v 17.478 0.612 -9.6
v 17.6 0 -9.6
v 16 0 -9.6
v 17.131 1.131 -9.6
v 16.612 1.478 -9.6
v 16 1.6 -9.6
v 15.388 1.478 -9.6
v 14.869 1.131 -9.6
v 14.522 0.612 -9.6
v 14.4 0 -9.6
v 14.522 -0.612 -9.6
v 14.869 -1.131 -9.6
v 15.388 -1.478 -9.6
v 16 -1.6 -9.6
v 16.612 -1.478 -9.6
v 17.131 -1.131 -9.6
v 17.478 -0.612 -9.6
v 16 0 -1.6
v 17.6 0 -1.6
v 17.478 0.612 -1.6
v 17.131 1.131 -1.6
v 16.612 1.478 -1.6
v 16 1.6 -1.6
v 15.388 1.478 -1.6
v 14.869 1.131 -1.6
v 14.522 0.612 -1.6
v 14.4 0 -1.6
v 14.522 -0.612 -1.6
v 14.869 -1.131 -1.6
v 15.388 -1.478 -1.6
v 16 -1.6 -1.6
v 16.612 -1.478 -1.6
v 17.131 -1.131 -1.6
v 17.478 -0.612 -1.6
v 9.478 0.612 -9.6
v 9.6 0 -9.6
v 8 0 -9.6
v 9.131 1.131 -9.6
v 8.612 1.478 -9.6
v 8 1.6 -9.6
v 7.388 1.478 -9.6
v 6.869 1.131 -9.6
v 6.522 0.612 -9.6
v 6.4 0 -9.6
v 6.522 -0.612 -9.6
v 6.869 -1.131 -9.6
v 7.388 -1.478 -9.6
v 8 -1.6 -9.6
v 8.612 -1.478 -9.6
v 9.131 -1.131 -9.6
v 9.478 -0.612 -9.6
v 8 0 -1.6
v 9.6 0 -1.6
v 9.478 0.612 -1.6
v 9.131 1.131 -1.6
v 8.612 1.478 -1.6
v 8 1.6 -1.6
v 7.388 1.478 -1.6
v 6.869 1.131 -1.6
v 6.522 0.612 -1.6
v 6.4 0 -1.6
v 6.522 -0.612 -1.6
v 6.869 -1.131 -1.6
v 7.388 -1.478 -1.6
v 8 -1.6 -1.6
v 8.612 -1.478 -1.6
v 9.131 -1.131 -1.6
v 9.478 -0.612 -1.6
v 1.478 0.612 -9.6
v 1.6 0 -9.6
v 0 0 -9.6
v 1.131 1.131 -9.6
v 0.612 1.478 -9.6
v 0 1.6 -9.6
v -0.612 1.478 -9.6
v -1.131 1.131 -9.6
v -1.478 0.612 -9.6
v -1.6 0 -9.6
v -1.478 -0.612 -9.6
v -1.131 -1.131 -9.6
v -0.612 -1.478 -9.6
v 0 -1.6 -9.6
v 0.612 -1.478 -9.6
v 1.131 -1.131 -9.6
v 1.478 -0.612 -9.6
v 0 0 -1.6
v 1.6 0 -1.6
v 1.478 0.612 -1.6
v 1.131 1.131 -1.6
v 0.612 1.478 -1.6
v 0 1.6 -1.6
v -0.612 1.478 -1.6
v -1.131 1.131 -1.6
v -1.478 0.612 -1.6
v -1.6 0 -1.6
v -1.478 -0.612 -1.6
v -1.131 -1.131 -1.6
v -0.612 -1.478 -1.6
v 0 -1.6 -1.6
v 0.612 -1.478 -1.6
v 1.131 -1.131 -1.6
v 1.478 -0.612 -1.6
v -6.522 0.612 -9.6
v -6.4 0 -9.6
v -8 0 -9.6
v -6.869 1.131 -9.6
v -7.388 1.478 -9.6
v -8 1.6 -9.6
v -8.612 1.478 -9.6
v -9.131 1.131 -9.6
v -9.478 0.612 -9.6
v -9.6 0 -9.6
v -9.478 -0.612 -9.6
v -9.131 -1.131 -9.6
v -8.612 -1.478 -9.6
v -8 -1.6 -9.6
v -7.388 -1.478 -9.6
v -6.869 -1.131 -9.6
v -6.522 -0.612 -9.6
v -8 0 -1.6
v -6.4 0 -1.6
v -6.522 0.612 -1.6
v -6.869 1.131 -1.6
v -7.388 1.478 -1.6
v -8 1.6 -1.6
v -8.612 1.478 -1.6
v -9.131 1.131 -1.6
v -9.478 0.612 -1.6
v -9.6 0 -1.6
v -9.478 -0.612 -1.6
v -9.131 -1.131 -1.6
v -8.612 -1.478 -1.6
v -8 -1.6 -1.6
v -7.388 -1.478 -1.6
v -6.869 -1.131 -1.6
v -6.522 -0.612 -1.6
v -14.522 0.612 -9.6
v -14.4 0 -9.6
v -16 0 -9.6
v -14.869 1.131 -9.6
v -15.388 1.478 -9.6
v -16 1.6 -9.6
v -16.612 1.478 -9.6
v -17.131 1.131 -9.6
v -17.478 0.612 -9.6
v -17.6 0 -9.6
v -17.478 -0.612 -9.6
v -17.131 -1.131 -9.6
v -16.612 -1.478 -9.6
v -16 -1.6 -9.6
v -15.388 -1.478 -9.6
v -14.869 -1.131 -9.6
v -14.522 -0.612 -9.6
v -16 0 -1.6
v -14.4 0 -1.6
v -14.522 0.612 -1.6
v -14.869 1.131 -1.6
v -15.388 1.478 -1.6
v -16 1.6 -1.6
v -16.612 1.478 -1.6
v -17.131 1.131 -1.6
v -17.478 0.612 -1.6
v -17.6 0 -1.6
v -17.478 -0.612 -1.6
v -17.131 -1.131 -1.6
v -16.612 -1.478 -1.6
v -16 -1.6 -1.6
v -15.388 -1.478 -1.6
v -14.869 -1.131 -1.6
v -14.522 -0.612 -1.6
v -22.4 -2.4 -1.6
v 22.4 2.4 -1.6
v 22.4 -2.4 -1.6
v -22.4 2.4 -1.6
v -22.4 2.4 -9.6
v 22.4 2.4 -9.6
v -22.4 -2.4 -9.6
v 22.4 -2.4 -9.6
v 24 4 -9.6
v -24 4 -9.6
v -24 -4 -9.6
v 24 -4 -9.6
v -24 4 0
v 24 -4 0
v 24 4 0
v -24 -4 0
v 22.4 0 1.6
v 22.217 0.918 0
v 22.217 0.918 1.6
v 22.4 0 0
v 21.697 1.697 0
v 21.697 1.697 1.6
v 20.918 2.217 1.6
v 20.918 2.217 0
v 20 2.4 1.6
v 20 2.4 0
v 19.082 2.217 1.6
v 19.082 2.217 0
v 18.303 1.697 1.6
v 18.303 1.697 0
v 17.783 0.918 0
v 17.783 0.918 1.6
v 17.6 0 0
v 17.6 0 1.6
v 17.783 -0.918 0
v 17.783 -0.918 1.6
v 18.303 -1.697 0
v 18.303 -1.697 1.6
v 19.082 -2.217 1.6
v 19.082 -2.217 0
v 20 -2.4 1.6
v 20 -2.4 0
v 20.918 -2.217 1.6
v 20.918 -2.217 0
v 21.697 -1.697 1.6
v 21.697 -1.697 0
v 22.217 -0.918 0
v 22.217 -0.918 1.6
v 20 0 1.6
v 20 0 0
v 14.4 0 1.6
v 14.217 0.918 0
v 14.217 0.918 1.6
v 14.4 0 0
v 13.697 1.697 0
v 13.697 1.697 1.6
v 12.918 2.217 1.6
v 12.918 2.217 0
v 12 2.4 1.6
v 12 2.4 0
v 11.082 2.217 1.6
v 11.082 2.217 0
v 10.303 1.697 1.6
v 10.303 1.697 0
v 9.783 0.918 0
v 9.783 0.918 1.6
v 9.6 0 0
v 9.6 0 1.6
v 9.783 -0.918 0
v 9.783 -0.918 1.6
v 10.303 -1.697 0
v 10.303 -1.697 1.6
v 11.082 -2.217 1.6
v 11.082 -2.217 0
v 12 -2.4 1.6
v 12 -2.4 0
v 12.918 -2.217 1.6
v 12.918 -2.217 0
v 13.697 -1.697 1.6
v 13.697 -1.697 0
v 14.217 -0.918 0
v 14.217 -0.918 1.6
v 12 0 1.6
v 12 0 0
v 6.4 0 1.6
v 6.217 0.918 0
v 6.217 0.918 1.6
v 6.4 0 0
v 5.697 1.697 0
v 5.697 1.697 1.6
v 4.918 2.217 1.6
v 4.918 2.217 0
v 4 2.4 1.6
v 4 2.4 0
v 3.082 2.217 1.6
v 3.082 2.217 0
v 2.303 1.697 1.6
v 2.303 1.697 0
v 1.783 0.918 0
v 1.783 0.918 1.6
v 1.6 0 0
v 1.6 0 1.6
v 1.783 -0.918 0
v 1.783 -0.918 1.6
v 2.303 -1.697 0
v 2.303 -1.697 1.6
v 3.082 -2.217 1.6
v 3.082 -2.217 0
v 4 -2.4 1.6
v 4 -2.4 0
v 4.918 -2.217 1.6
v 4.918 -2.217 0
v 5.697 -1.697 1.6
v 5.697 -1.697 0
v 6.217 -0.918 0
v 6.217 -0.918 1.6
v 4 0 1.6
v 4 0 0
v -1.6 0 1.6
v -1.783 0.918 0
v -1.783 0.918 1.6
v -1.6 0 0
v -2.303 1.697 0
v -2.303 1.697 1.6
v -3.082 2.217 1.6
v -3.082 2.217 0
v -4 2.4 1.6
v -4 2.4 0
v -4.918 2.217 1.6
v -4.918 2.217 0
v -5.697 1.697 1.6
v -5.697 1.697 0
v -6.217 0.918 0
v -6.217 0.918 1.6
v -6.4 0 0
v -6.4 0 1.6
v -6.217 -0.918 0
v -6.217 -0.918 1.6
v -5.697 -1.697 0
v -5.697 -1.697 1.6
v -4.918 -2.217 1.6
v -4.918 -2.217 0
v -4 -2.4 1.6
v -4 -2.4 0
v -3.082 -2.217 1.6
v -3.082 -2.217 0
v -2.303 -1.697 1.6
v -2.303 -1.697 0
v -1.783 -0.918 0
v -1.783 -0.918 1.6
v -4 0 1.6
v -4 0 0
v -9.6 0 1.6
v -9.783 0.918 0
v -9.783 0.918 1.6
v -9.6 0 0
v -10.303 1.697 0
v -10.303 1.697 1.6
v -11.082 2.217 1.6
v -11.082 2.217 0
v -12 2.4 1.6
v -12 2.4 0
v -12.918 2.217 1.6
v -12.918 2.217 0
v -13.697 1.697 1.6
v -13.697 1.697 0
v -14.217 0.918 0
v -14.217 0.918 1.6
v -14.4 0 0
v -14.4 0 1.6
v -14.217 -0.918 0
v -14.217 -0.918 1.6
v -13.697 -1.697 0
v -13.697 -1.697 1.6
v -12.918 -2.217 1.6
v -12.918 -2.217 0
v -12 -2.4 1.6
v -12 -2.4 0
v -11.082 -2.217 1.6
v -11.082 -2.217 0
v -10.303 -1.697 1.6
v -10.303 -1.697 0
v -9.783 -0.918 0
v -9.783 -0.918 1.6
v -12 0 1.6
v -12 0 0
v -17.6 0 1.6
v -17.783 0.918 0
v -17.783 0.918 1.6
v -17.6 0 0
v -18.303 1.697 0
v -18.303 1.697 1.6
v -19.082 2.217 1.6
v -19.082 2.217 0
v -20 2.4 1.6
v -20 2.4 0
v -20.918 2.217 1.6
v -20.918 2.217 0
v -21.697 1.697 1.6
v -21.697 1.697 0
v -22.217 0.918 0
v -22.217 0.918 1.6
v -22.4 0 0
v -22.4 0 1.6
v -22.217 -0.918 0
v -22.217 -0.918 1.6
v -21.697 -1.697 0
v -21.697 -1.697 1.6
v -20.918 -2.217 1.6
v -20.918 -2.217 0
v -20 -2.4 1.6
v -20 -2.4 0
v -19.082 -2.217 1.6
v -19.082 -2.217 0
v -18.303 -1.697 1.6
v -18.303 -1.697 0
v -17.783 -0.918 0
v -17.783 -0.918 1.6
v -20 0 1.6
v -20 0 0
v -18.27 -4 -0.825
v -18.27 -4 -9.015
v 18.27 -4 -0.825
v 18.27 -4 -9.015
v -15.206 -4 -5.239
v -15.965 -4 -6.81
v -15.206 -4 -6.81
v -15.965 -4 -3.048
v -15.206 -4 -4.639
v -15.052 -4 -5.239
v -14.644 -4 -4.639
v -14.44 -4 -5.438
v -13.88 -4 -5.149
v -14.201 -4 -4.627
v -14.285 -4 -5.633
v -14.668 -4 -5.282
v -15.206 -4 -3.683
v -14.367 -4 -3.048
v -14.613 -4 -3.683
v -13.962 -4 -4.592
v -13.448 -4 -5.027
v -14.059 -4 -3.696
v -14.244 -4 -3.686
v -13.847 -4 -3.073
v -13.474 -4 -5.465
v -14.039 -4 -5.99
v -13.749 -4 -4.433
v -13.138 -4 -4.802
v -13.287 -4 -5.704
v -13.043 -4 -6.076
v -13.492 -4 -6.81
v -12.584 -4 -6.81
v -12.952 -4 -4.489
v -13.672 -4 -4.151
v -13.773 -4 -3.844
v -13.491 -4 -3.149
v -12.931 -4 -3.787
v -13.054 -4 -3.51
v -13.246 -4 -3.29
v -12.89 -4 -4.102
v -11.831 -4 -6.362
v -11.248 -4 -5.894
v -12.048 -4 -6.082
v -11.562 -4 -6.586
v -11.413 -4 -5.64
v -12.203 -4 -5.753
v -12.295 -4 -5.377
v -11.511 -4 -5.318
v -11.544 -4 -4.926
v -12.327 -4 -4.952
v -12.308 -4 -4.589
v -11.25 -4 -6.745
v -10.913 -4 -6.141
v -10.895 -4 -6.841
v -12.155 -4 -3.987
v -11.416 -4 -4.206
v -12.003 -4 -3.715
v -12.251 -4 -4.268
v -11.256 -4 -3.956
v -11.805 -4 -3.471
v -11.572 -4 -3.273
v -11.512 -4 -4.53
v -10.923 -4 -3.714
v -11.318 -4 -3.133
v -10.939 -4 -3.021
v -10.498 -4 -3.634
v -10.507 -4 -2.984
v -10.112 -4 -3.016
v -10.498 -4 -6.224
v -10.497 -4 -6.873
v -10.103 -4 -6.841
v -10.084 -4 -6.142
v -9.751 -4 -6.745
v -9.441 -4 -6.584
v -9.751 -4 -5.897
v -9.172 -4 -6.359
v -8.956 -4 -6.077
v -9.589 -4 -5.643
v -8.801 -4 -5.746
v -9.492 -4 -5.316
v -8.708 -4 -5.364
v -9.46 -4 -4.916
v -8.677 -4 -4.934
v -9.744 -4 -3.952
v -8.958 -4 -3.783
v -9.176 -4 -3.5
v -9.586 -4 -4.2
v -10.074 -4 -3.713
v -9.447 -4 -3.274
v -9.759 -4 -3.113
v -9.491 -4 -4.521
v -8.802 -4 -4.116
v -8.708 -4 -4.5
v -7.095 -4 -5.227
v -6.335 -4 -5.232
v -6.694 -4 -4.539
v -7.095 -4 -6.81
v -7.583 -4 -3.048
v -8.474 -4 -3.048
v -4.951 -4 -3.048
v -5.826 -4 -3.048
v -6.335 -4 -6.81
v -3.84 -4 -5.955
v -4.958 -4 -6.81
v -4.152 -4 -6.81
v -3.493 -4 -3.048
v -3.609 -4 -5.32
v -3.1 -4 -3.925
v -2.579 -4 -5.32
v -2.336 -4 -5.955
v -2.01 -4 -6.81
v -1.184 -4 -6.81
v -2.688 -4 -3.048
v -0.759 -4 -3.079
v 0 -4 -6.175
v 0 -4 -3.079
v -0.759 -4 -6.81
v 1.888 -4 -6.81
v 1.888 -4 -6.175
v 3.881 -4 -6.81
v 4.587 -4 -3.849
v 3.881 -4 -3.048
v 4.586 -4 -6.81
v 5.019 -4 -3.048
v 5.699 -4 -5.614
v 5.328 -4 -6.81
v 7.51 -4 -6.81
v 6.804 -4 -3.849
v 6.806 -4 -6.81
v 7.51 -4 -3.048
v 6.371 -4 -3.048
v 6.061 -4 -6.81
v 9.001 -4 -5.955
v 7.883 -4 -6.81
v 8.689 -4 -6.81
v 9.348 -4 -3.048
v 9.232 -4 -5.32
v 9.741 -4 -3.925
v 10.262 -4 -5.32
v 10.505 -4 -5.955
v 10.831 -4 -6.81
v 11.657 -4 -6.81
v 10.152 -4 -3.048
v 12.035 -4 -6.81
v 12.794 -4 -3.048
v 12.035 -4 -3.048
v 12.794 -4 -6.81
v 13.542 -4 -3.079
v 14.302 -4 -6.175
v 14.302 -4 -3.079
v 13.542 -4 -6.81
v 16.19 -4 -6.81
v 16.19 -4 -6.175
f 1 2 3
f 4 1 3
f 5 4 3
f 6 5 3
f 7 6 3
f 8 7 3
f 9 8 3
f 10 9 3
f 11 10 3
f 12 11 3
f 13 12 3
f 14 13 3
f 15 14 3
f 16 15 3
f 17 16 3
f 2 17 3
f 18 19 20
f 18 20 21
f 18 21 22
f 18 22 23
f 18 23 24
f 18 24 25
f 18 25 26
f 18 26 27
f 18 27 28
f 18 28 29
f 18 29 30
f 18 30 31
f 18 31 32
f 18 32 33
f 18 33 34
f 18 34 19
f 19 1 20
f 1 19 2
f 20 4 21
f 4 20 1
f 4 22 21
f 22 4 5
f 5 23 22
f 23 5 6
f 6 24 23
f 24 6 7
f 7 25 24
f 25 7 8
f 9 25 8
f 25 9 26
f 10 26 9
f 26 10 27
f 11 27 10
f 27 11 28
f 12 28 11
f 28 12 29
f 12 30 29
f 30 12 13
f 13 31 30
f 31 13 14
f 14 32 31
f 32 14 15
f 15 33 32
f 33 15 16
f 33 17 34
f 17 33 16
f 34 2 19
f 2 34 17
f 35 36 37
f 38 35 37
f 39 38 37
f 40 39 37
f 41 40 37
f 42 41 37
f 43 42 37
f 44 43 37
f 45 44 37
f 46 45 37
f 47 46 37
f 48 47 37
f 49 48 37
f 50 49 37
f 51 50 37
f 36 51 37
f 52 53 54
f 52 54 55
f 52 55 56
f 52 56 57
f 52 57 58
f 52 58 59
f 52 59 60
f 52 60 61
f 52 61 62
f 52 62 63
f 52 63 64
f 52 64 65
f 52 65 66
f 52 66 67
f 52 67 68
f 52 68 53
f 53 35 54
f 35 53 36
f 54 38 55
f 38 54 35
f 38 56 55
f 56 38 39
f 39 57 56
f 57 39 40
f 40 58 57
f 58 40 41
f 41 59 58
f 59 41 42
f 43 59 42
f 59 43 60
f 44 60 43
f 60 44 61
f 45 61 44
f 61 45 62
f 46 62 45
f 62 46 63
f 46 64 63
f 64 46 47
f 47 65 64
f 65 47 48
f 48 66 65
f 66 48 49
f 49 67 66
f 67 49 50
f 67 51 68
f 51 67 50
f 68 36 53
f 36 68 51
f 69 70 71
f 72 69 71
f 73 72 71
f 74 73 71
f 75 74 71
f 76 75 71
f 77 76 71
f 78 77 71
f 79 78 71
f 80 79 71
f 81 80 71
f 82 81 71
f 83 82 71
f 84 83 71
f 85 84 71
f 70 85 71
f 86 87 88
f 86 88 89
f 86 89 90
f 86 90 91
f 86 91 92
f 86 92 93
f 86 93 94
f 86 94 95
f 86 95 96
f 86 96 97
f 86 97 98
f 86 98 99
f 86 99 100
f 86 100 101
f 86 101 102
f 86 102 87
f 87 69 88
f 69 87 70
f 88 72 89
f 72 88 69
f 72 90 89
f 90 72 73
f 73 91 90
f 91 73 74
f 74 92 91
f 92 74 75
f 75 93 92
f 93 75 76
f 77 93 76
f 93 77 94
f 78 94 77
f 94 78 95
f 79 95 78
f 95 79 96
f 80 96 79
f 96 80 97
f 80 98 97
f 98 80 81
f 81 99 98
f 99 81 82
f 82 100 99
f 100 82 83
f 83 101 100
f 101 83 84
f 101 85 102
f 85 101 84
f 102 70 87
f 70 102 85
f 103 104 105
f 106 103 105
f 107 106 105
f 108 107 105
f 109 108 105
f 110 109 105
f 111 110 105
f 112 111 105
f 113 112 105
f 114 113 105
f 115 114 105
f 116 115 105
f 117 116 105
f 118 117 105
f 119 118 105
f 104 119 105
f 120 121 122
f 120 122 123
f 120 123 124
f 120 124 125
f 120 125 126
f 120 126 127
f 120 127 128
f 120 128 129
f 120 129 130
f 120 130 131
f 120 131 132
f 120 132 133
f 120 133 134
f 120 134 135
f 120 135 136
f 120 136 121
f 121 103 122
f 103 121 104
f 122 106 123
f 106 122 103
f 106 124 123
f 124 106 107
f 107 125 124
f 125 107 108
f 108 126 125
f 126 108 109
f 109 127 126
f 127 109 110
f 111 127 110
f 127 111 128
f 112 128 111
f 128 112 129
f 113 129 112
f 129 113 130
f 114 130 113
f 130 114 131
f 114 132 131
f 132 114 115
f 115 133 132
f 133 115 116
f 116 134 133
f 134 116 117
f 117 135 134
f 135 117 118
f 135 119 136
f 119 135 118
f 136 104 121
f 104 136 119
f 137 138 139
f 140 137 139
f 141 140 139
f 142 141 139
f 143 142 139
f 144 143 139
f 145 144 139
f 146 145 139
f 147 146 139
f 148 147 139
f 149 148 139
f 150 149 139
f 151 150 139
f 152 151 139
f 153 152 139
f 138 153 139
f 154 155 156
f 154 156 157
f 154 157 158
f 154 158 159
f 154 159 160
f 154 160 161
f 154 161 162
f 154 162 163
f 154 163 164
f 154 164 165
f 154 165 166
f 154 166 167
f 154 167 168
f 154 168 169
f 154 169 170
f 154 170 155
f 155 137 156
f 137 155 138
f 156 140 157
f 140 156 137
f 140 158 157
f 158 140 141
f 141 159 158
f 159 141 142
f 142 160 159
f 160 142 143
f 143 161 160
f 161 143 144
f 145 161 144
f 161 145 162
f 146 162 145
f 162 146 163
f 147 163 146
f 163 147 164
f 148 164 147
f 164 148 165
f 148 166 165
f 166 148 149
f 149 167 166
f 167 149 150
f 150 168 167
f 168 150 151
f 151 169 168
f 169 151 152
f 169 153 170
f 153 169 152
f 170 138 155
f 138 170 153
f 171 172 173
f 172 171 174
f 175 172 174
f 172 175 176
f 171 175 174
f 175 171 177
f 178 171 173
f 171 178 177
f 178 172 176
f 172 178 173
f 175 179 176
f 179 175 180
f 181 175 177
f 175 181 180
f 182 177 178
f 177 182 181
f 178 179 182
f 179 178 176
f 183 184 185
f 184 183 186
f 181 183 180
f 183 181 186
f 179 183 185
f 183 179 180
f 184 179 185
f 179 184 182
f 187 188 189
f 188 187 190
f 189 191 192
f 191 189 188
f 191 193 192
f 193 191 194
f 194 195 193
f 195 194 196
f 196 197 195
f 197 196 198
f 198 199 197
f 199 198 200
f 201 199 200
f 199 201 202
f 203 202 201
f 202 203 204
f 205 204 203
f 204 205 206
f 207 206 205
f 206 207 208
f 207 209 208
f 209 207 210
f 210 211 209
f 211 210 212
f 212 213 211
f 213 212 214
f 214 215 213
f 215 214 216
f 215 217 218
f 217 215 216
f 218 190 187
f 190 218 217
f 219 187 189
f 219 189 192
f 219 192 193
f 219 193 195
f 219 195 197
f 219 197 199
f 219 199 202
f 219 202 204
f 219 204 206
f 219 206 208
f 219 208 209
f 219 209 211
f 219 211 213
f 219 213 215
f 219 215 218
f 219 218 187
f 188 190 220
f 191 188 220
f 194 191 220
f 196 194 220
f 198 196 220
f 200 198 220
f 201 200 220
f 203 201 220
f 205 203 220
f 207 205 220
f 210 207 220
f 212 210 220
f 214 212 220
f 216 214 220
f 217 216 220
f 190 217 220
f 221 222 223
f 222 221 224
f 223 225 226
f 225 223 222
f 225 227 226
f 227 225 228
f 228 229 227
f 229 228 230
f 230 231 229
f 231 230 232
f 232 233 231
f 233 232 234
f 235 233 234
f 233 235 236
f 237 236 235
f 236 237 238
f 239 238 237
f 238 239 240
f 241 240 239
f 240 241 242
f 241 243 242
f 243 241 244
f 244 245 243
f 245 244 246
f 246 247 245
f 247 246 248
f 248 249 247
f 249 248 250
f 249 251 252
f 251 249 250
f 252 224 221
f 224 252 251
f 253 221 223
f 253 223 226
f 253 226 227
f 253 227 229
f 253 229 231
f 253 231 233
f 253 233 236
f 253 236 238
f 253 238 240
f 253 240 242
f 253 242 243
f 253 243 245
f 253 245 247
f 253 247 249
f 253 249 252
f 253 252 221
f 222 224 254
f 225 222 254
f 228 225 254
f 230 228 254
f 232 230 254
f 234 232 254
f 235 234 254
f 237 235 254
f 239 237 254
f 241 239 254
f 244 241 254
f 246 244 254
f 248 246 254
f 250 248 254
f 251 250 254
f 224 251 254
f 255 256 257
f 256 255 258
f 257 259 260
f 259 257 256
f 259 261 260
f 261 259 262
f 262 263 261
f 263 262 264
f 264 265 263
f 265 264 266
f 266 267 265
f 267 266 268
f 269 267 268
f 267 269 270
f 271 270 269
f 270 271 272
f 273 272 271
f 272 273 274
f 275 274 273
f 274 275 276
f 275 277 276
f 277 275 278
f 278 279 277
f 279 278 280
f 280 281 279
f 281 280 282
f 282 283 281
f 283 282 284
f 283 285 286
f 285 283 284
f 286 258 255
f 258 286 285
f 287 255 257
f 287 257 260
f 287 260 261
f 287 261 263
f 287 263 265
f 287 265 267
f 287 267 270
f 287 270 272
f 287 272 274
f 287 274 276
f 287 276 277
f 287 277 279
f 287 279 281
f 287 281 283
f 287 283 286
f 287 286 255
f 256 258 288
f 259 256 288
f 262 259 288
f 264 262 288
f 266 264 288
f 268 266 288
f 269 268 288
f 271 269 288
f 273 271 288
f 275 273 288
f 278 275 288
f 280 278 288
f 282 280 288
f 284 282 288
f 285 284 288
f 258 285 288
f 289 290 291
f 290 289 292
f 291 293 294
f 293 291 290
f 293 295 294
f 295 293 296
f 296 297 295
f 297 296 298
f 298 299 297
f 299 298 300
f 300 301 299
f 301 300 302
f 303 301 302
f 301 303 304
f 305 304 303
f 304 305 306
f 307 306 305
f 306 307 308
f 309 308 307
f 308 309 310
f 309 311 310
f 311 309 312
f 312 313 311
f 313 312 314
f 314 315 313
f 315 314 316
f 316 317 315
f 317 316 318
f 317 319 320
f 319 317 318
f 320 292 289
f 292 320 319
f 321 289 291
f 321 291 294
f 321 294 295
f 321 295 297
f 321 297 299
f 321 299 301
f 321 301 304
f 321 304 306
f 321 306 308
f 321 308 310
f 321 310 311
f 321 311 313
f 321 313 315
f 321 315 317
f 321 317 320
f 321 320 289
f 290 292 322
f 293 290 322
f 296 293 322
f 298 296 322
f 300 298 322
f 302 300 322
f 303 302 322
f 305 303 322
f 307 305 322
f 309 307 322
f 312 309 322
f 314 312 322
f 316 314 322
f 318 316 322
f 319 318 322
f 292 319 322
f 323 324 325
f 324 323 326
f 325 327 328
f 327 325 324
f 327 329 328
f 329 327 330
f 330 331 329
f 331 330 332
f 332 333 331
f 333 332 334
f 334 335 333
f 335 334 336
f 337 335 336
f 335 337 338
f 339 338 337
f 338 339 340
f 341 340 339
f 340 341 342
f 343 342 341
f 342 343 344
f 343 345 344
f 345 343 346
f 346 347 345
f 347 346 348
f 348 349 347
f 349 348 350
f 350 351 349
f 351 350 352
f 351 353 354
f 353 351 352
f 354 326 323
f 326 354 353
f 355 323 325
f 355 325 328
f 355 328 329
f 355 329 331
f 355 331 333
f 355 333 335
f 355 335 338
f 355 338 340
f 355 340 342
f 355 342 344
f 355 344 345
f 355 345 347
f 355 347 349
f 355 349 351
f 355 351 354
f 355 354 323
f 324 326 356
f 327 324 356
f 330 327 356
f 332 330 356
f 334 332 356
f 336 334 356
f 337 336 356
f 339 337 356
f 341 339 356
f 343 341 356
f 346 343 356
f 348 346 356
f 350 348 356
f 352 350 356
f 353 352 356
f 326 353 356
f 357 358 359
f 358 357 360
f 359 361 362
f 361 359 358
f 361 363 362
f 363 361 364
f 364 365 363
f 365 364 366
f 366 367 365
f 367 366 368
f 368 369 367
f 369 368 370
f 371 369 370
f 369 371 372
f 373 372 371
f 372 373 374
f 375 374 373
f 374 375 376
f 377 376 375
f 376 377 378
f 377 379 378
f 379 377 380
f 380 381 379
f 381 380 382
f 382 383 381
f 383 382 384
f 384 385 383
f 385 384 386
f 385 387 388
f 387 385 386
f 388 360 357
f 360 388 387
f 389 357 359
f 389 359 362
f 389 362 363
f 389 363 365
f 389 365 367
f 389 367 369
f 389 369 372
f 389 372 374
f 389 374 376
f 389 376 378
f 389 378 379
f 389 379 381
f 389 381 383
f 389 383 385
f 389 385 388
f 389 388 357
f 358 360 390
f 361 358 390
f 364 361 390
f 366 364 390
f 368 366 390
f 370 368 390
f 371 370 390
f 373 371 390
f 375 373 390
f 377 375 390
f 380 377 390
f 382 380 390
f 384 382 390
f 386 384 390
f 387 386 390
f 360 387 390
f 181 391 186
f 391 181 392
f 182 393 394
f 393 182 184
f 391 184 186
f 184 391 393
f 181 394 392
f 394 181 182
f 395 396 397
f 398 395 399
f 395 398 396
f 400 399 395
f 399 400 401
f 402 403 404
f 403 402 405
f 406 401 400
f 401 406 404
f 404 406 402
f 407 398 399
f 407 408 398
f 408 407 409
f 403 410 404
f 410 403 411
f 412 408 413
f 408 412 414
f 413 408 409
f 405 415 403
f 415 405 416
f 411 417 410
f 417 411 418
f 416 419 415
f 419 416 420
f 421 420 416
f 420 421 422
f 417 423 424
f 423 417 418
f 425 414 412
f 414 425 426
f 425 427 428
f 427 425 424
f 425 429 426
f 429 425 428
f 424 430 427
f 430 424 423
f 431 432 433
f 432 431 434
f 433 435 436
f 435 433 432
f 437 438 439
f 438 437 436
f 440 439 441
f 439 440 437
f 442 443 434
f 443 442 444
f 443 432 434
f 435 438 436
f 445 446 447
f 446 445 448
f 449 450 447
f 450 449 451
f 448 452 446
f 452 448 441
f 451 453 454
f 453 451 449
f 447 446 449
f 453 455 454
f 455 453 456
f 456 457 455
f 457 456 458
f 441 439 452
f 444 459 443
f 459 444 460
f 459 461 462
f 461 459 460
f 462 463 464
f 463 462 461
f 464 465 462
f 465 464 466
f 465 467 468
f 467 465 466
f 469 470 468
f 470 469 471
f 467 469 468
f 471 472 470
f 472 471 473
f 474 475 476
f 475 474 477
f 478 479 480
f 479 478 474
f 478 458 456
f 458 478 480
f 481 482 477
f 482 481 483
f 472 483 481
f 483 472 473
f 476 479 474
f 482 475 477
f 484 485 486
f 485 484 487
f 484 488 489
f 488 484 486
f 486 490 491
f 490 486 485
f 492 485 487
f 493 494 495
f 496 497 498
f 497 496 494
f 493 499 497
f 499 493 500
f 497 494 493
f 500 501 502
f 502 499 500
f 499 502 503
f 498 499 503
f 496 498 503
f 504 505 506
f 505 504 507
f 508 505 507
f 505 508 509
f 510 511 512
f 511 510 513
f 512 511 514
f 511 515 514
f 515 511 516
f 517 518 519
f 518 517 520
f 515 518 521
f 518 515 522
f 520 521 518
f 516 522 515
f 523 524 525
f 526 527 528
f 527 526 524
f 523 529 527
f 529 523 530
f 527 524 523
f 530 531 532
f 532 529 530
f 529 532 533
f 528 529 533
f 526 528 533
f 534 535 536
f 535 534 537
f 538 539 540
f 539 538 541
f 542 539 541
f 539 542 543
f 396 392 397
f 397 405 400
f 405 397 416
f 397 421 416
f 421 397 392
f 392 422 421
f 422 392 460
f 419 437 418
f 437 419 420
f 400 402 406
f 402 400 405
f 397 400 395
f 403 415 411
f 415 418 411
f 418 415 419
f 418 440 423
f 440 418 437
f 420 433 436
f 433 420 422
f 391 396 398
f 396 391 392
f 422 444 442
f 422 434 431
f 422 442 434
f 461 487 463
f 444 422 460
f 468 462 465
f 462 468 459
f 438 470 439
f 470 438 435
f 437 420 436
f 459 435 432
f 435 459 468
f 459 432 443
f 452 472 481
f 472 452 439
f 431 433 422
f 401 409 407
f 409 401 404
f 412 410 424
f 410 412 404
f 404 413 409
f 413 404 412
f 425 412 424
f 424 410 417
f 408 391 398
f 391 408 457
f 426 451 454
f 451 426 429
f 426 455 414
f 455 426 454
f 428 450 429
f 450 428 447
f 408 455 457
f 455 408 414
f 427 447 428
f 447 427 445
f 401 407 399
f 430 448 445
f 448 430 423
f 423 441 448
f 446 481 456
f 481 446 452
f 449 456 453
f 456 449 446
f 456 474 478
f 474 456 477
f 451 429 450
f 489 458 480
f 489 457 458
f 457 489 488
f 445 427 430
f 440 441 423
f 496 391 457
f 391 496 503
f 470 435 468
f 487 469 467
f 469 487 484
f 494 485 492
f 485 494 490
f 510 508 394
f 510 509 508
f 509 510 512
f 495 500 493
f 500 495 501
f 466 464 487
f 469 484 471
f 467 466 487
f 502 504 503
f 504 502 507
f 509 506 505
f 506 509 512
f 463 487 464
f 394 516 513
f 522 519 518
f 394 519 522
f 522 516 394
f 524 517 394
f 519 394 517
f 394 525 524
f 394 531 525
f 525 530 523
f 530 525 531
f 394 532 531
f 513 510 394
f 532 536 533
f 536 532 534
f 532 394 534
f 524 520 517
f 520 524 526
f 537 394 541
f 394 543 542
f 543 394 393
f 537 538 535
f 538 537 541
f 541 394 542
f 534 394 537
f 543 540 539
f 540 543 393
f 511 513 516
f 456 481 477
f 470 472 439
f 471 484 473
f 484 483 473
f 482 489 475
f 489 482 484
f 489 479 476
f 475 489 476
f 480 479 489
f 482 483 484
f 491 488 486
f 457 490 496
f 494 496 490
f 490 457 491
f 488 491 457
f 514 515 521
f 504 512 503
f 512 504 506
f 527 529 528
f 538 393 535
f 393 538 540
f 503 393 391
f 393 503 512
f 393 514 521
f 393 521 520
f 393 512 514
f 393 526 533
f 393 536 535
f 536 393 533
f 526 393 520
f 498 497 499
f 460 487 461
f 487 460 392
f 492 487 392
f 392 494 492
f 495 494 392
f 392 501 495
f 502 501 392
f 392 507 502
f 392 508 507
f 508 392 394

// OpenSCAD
// file: ../p/4-4edge.scad
use <../lib.scad>
function ldraw_lib__4_4edge() = [
// 0 Circle 1.0
// 0 Name: 4-4edge.dat
// 0 Author: James Jessiman
// 0 !LDRAW_ORG Primitive UPDATE 2017-01
// 0 !LICENSE Licensed under CC BY 2.0 and CC BY 4.0 : see CAreadme.txt
// 
// 0 BFC CERTIFY CCW
  [0,"BFC","CERTIFY"],
  [0,"BFC","CCW"],
// 
// 0 !HISTORY 1998-12-15 [PTadmin] Official Update 1998-10
// 0 !HISTORY 2005-12-28 [PTadmin] Official Update 2005-01
// 0 !HISTORY 2007-06-24 [PTadmin] Header formatted for Contributor Agreement
// 0 !HISTORY 2008-07-01 [PTadmin] Official Update 2008-01
// 0 !HISTORY 2017-01-15 [Steffen] BFCed
// 0 !HISTORY 2017-12-30 [PTadmin] Official Update 2017-01
// 
// 
// 2 24 1 0 0 0.9239 0 0.3827
  [2,24,1,0,0,0.9239,0,0.3827],
// 2 24 0.9239 0 0.3827 0.7071 0 0.7071
  [2,24,0.9239,0,0.3827,0.7071,0,0.7071],
// 2 24 0.7071 0 0.7071 0.3827 0 0.9239
  [2,24,0.7071,0,0.7071,0.3827,0,0.9239],
// 2 24 0.3827 0 0.9239 0 0 1
  [2,24,0.3827,0,0.9239,0,0,1],
// 2 24 0 0 1 -0.3827 0 0.9239
  [2,24,0,0,1,-0.3827,0,0.9239],
// 2 24 -0.3827 0 0.9239 -0.7071 0 0.7071
  [2,24,-0.3827,0,0.9239,-0.7071,0,0.7071],
// 2 24 -0.7071 0 0.7071 -0.9239 0 0.3827
  [2,24,-0.7071,0,0.7071,-0.9239,0,0.3827],
// 2 24 -0.9239 0 0.3827 -1 0 -0
  [2,24,-0.9239,0,0.3827,-1,0,-0],
// 2 24 -1 0 -0 -0.9239 0 -0.3827
  [2,24,-1,0,-0,-0.9239,0,-0.3827],
// 2 24 -0.9239 0 -0.3827 -0.7071 0 -0.7071
  [2,24,-0.9239,0,-0.3827,-0.7071,0,-0.7071],
// 2 24 -0.7071 0 -0.7071 -0.3827 0 -0.9239
  [2,24,-0.7071,0,-0.7071,-0.3827,0,-0.9239],
// 2 24 -0.3827 0 -0.9239 0 0 -1
  [2,24,-0.3827,0,-0.9239,0,0,-1],
// 2 24 0 0 -1 0.3827 0 -0.9239
  [2,24,0,0,-1,0.3827,0,-0.9239],
// 2 24 0.3827 0 -0.9239 0.7071 0 -0.7071
  [2,24,0.3827,0,-0.9239,0.7071,0,-0.7071],
// 2 24 0.7071 0 -0.7071 0.9239 0 -0.3827
  [2,24,0.7071,0,-0.7071,0.9239,0,-0.3827],
// 2 24 0.9239 0 -0.3827 1 0 0
  [2,24,0.9239,0,-0.3827,1,0,0],
];
module ldraw_lib__4_4edge(step=0, col=false, unit=2/5, alt=false, line=0.2, solid=!$preview)
    makepoly(ldraw_lib__4_4edge(), step=step, col=col, unit=unit, alt=alt, line=line, solid=solid);
ldraw_lib__4_4edge(line=0.2);
// file: ../p/4-4disc.scad
use <../lib.scad>
function ldraw_lib__4_4disc() = [
// 0 Disc 1.0
// 0 Name: 4-4disc.dat
// 0 Author: James Jessiman
// 0 !LDRAW_ORG Primitive UPDATE 2002-02
// 0 !LICENSE Licensed under CC BY 2.0 and CC BY 4.0 : see CAreadme.txt
// 
// 0 BFC CERTIFY CCW
  [0,"BFC","CERTIFY"],
  [0,"BFC","CCW"],
// 
// 0 !HISTORY 1998-12-15 [PTadmin] Official Update 1998-10
// 0 !HISTORY 2002-03-23 [sbliss] Added BFC statement
// 0 !HISTORY 2002-04-25 [PTadmin] Official Update 2002-02
// 0 !HISTORY 2007-06-24 [PTadmin] Header formatted for Contributor Agreement
// 0 !HISTORY 2008-07-01 [PTadmin] Official Update 2008-01
// 
// 
// 3 16 0 0 0 1 0 0 0.9239 0 0.3827
  [3,16,0,0,0,1,0,0,0.9239,0,0.3827],
// 3 16 0 0 0 0.9239 0 0.3827 0.7071 0 0.7071
  [3,16,0,0,0,0.9239,0,0.3827,0.7071,0,0.7071],
// 3 16 0 0 0 0.7071 0 0.7071 0.3827 0 0.9239
  [3,16,0,0,0,0.7071,0,0.7071,0.3827,0,0.9239],
// 3 16 0 0 0 0.3827 0 0.9239 0 0 1
  [3,16,0,0,0,0.3827,0,0.9239,0,0,1],
// 3 16 0 0 0 0 0 1 -0.3827 0 0.9239
  [3,16,0,0,0,0,0,1,-0.3827,0,0.9239],
// 3 16 0 0 0 -0.3827 0 0.9239 -0.7071 0 0.7071
  [3,16,0,0,0,-0.3827,0,0.9239,-0.7071,0,0.7071],
// 3 16 0 0 0 -0.7071 0 0.7071 -0.9239 0 0.3827
  [3,16,0,0,0,-0.7071,0,0.7071,-0.9239,0,0.3827],
// 3 16 0 0 0 -0.9239 0 0.3827 -1 0 -0
  [3,16,0,0,0,-0.9239,0,0.3827,-1,0,-0],
// 3 16 0 0 0 -1 0 -0 -0.9239 0 -0.3827
  [3,16,0,0,0,-1,0,-0,-0.9239,0,-0.3827],
// 3 16 0 0 0 -0.9239 0 -0.3827 -0.7071 0 -0.7071
  [3,16,0,0,0,-0.9239,0,-0.3827,-0.7071,0,-0.7071],
// 3 16 0 0 0 -0.7071 0 -0.7071 -0.3827 0 -0.9239
  [3,16,0,0,0,-0.7071,0,-0.7071,-0.3827,0,-0.9239],
// 3 16 0 0 0 -0.3827 0 -0.9239 0 0 -1
  [3,16,0,0,0,-0.3827,0,-0.9239,0,0,-1],
// 3 16 0 0 0 0 0 -1 0.3827 0 -0.9239
  [3,16,0,0,0,0,0,-1,0.3827,0,-0.9239],
// 3 16 0 0 0 0.3827 0 -0.9239 0.7071 0 -0.7071
  [3,16,0,0,0,0.3827,0,-0.9239,0.7071,0,-0.7071],
// 3 16 0 0 0 0.7071 0 -0.7071 0.9239 0 -0.3827
  [3,16,0,0,0,0.7071,0,-0.7071,0.9239,0,-0.3827],
// 3 16 0 0 0 0.9239 0 -0.3827 1 0 0
  [3,16,0,0,0,0.9239,0,-0.3827,1,0,0],
// 0
];
module ldraw_lib__4_4disc(step=0, col=false, unit=2/5, alt=false, line=0.2, solid=!$preview)
    makepoly(ldraw_lib__4_4disc(), step=step, col=col, unit=unit, alt=alt, line=line, solid=solid);
ldraw_lib__4_4disc(line=0.2);
// file: ../p/4-4cyli.scad
use <../lib.scad>
$fa=1; $fs=0.2;
function ldraw_lib__4_4cyli(realsolid=false) = [
// 0 Cylinder 1.0
// 0 Name: 4-4cyli.dat
// 0 Author: James Jessiman
// 0 !LDRAW_ORG Primitive UPDATE 2005-01
// 0 !LICENSE Licensed under CC BY 2.0 and CC BY 4.0 : see CAreadme.txt
// 
// 0 BFC CERTIFY CCW
  [0,"BFC","CERTIFY"],
  [0,"BFC","CCW"],
// 
// 0 !HISTORY 1998-12-15 [PTadmin] Official Update 1998-10
// 0 !HISTORY 2002-03-23 [sbliss] Added BFC statement; merged headers from files in distributions LDraw 0.27 and Complete.
// 0 !HISTORY 2002-04-25 [PTadmin] Official Update 2002-02
// 0 !HISTORY 2004-12-14 [guyvivan] BFC CCW
// 0 !HISTORY 2005-12-28 [PTadmin] Official Update 2005-01
// 0 !HISTORY 2007-06-24 [PTadmin] Header formatted for Contributor Agreement
// 0 !HISTORY 2008-07-01 [PTadmin] Official Update 2008-01
// 
// 
// 4 16 1 1 0 0.9239 1 0.3827 0.9239 0 0.3827 1 0 0
  [4,16,1,1,0,0.9239,1,0.3827,0.9239,0,0.3827,1,0,0],
// 5 24 1 0 0 1 1 0 0.9239 0 0.3827 0.9239 0 -0.3827
  [5,24,1,0,0,1,1,0,0.9239,0,0.3827,0.9239,0,-0.3827],
// 4 16 0.9239 1 0.3827 0.7071 1 0.7071 0.7071 0 0.7071 0.9239 0 0.3827
  [4,16,0.9239,1,0.3827,0.7071,1,0.7071,0.7071,0,0.7071,0.9239,0,0.3827],
// 5 24 0.9239 0 0.3827 0.9239 1 0.3827 0.7071 0 0.7071 1 0 0
  [5,24,0.9239,0,0.3827,0.9239,1,0.3827,0.7071,0,0.7071,1,0,0],
// 4 16 0.7071 1 0.7071 0.3827 1 0.9239 0.3827 0 0.9239 0.7071 0 0.7071
  [4,16,0.7071,1,0.7071,0.3827,1,0.9239,0.3827,0,0.9239,0.7071,0,0.7071],
// 5 24 0.7071 0 0.7071 0.7071 1 0.7071 0.3827 0 0.9239 0.9239 0 0.3827
  [5,24,0.7071,0,0.7071,0.7071,1,0.7071,0.3827,0,0.9239,0.9239,0,0.3827],
// 4 16 0.3827 1 0.9239 0 1 1 0 0 1 0.3827 0 0.9239
  [4,16,0.3827,1,0.9239,0,1,1,0,0,1,0.3827,0,0.9239],
// 5 24 0.3827 0 0.9239 0.3827 1 0.9239 0 0 1 0.7071 0 0.7071
  [5,24,0.3827,0,0.9239,0.3827,1,0.9239,0,0,1,0.7071,0,0.7071],
// 4 16 0 1 1 -0.3827 1 0.9239 -0.3827 0 0.9239 0 0 1
  [4,16,0,1,1,-0.3827,1,0.9239,-0.3827,0,0.9239,0,0,1],
// 5 24 0 0 1 0 1 1 -0.3827 0 0.9239 0.3827 0 0.9239
  [5,24,0,0,1,0,1,1,-0.3827,0,0.9239,0.3827,0,0.9239],
// 4 16 -0.3827 1 0.9239 -0.7071 1 0.7071 -0.7071 0 0.7071 -0.3827 0 0.9239
  [4,16,-0.3827,1,0.9239,-0.7071,1,0.7071,-0.7071,0,0.7071,-0.3827,0,0.9239],
// 5 24 -0.3827 0 0.9239 -0.3827 1 0.9239 -0.7071 0 0.7071 0 0 1
  [5,24,-0.3827,0,0.9239,-0.3827,1,0.9239,-0.7071,0,0.7071,0,0,1],
// 4 16 -0.7071 1 0.7071 -0.9239 1 0.3827 -0.9239 0 0.3827 -0.7071 0 0.7071
  [4,16,-0.7071,1,0.7071,-0.9239,1,0.3827,-0.9239,0,0.3827,-0.7071,0,0.7071],
// 5 24 -0.7071 0 0.7071 -0.7071 1 0.7071 -0.9239 0 0.3827 -0.3827 0 0.9239
  [5,24,-0.7071,0,0.7071,-0.7071,1,0.7071,-0.9239,0,0.3827,-0.3827,0,0.9239],
// 4 16 -0.9239 1 0.3827 -1 1 0 -1 0 0 -0.9239 0 0.3827
  [4,16,-0.9239,1,0.3827,-1,1,0,-1,0,0,-0.9239,0,0.3827],
// 5 24 -0.9239 0 0.3827 -0.9239 1 0.3827 -1 0 0 -0.7071 0 0.7071
  [5,24,-0.9239,0,0.3827,-0.9239,1,0.3827,-1,0,0,-0.7071,0,0.7071],
// 4 16 -1 1 0 -0.9239 1 -0.3827 -0.9239 0 -0.3827 -1 0 0
  [4,16,-1,1,0,-0.9239,1,-0.3827,-0.9239,0,-0.3827,-1,0,0],
// 5 24 -1 0 0 -1 1 0 -0.9239 0 -0.3827 -0.9239 0 0.3827
  [5,24,-1,0,0,-1,1,0,-0.9239,0,-0.3827,-0.9239,0,0.3827],
// 4 16 -0.9239 1 -0.3827 -0.7071 1 -0.7071 -0.7071 0 -0.7071 -0.9239 0 -0.3827
  [4,16,-0.9239,1,-0.3827,-0.7071,1,-0.7071,-0.7071,0,-0.7071,-0.9239,0,-0.3827],
// 5 24 -0.9239 0 -0.3827 -0.9239 1 -0.3827 -0.7071 0 -0.7071 -1 0 0
  [5,24,-0.9239,0,-0.3827,-0.9239,1,-0.3827,-0.7071,0,-0.7071,-1,0,0],
// 4 16 -0.7071 1 -0.7071 -0.3827 1 -0.9239 -0.3827 0 -0.9239 -0.7071 0 -0.7071
  [4,16,-0.7071,1,-0.7071,-0.3827,1,-0.9239,-0.3827,0,-0.9239,-0.7071,0,-0.7071],
// 5 24 -0.7071 0 -0.7071 -0.7071 1 -0.7071 -0.3827 0 -0.9239 -0.9239 0 -0.3827
  [5,24,-0.7071,0,-0.7071,-0.7071,1,-0.7071,-0.3827,0,-0.9239,-0.9239,0,-0.3827],
// 4 16 -0.3827 1 -0.9239 0 1 -1 0 0 -1 -0.3827 0 -0.9239
  [4,16,-0.3827,1,-0.9239,0,1,-1,0,0,-1,-0.3827,0,-0.9239],
// 5 24 -0.3827 0 -0.9239 -0.3827 1 -0.9239 0 0 -1 -0.7071 0 -0.7071
  [5,24,-0.3827,0,-0.9239,-0.3827,1,-0.9239,0,0,-1,-0.7071,0,-0.7071],
// 4 16 0 1 -1 0.3827 1 -0.9239 0.3827 0 -0.9239 0 0 -1
  [4,16,0,1,-1,0.3827,1,-0.9239,0.3827,0,-0.9239,0,0,-1],
// 5 24 0 0 -1 0 1 -1 0.3827 0 -0.9239 -0.3827 0 -0.9239
  [5,24,0,0,-1,0,1,-1,0.3827,0,-0.9239,-0.3827,0,-0.9239],
// 4 16 0.3827 1 -0.9239 0.7071 1 -0.7071 0.7071 0 -0.7071 0.3827 0 -0.9239
  [4,16,0.3827,1,-0.9239,0.7071,1,-0.7071,0.7071,0,-0.7071,0.3827,0,-0.9239],
// 5 24 0.3827 0 -0.9239 0.3827 1 -0.9239 0.7071 0 -0.7071 0 0 -1
  [5,24,0.3827,0,-0.9239,0.3827,1,-0.9239,0.7071,0,-0.7071,0,0,-1],
// 4 16 0.7071 1 -0.7071 0.9239 1 -0.3827 0.9239 0 -0.3827 0.7071 0 -0.7071
  [4,16,0.7071,1,-0.7071,0.9239,1,-0.3827,0.9239,0,-0.3827,0.7071,0,-0.7071],
// 5 24 0.7071 0 -0.7071 0.7071 1 -0.7071 0.9239 0 -0.3827 0.3827 0 -0.9239
  [5,24,0.7071,0,-0.7071,0.7071,1,-0.7071,0.9239,0,-0.3827,0.3827,0,-0.9239],
// 4 16 0.9239 1 -0.3827 1 1 0 1 0 0 0.9239 0 -0.3827
  [4,16,0.9239,1,-0.3827,1,1,0,1,0,0,0.9239,0,-0.3827],
// 5 24 0.9239 0 -0.3827 0.9239 1 -0.3827 1 0 0 0.7071 0 -0.7071
  [5,24,0.9239,0,-0.3827,0.9239,1,-0.3827,1,0,0,0.7071,0,-0.7071],
// 0
];
module ldraw_lib__4_4cyli(step=0, col=false, unit=2/5, alt=false, line=0.2, solid=!$preview)
    makepoly(ldraw_lib__4_4cyli(solid), step=step, col=col, unit=unit, alt=alt, line=line, solid=solid);
ldraw_lib__4_4cyli(line=0.2);
// file: ../p/stud3.scad
use <../lib.scad>
use <4-4cyli.scad>
use <4-4disc.scad>
use <4-4edge.scad>
function ldraw_lib__stud3() = [
// 0 Stud Tube Solid
// 0 Name: stud3.dat
// 0 Author: James Jessiman
// 0 !LDRAW_ORG Primitive UPDATE 2012-01
// 0 !LICENSE Licensed under CC BY 4.0 : see CAreadme.txt
// 
// 0 BFC CERTIFY CCW
  [0,"BFC","CERTIFY"],
  [0,"BFC","CCW"],
// 
// 0 !HISTORY 2002-04-04 [sbliss] Modified for BFC compliance
// 0 !HISTORY 2002-04-25 [PTadmin] Official Update 2002-02
// 0 !HISTORY 2007-06-24 [PTadmin] Header formatted for Contributor Agreement
// 0 !HISTORY 2008-07-01 [PTadmin] Official Update 2008-01
// 0 !HISTORY 2012-02-16 [Philo] Changed to CCW
// 0 !HISTORY 2012-03-30 [PTadmin] Official Update 2012-01
// 
// 
// 1 16 0 -4 0 4 0 0 0 1 0 0 0 4 4-4edge.dat
  [1,16,0,-4,0,4,0,0,0,1,0,0,0,4, ldraw_lib__4_4edge()],
// 1 16 0 0 0 4 0 0 0 1 0 0 0 4 4-4edge.dat
  [1,16,0,0,0,4,0,0,0,1,0,0,0,4, ldraw_lib__4_4edge()],
// 1 16 0 -4 0 4 0 0 0 1 0 0 0 4 4-4disc.dat
  [1,16,0,-4,0,4,0,0,0,1,0,0,0,4, ldraw_lib__4_4disc()],
  [-1,16,0,0,0,4,0,0,0,-1,0,0,0,4, ldraw_lib__4_4disc()],
// 1 16 0 -4 0 4 0 0 0 4 0 0 0 4 4-4cyli.dat
  [1,16,0,-4,0,4,0,0,0,4,0,0,0,4, ldraw_lib__4_4cyli()],
];
module ldraw_lib__stud3(step=0, col=false, unit=2/5, alt=false, line=0.2, solid=!$preview)
    makepoly(ldraw_lib__stud3(), step=step, col=col, unit=unit, alt=alt, line=line, solid=solid);
ldraw_lib__stud3(line=0.2);
// file: ../p/stud.scad
use <../lib.scad>
use <4-4cyli.scad>
use <4-4disc.scad>
use <4-4edge.scad>
function ldraw_lib__stud() = [
// 0 Stud
// 0 Name: stud.dat
// 0 Author: James Jessiman
// 0 !LDRAW_ORG Primitive UPDATE 2012-01
// 0 !LICENSE Licensed under CC BY 4.0 : see CAreadme.txt
// 
// 0 BFC CERTIFY CCW
  [0,"BFC","CERTIFY"],
  [0,"BFC","CCW"],
// 
// 0 !HISTORY 2002-04-04 [sbliss] Modified for BFC compliance
// 0 !HISTORY 2002-04-25 [PTadmin] Official Update 2002-02
// 0 !HISTORY 2007-06-24 [PTadmin] Header formatted for Contributor Agreement
// 0 !HISTORY 2008-07-01 [PTadmin] Official Update 2008-01
// 0 !HISTORY 2012-02-16 [Philo] Changed to CCW
// 0 !HISTORY 2012-03-30 [PTadmin] Official Update 2012-01
// 
// 
// 1 16 0 0 0 6 0 0 0 1 0 0 0 6 4-4edge.dat
  [1,16,0,0,0,6,0,0,0,1,0,0,0,6, ldraw_lib__4_4edge()],
// 1 16 0 -4 0 6 0 0 0 1 0 0 0 6 4-4edge.dat
  [1,16,0,-4,0,6,0,0,0,1,0,0,0,6, ldraw_lib__4_4edge()],
// 1 16 0 0 0 6 0 0 0 -4 0 0 0 6 4-4cyli.dat
  [1,16,0,0,0,6,0,0,0,-4,0,0,0,6, ldraw_lib__4_4cyli()],
// 1 16 0 -4 0 6 0 0 0 1 0 0 0 6 4-4disc.dat
  [1,16,0,-4,0,6,0,0,0,1,0,0,0,6, ldraw_lib__4_4disc()],
  [-1,16,0,0,0,6,0,0,0,-1,0,0,0,6, ldraw_lib__4_4disc()],
];
module ldraw_lib__stud(step=0, col=false, unit=2/5, alt=false, line=0.2, solid=!$preview)
    makepoly(ldraw_lib__stud(), step=step, col=col, unit=unit, alt=alt, line=line, solid=solid);
ldraw_lib__stud(line=0.2);
// file: ../p/box5.scad
use <../lib.scad>
function ldraw_lib__box5() = [
// 0 Box with 5 Faces and All Edges
// 0 Name: box5.dat
// 0 Author: James Jessiman
// 0 !LDRAW_ORG Primitive UPDATE 2012-01
// 0 !LICENSE Licensed under CC BY 2.0 and CC BY 4.0 : see CAreadme.txt
// 
// 0 BFC CERTIFY CCW
  [0,"BFC","CERTIFY"],
  [0,"BFC","CCW"],
// 
// 0 !HISTORY 2002-04-03 [sbliss] Modified for BFC compliance
// 0 !HISTORY 2002-04-25 [PTadmin] Official Update 2002-02
// 0 !HISTORY 2007-06-24 [PTadmin] Header formatted for Contributor Agreement
// 0 !HISTORY 2008-07-01 [PTadmin] Official Update 2008-01
// 0 !HISTORY 2012-02-16 [Philo] Changed to CCW
// 0 !HISTORY 2012-03-30 [PTadmin] Official Update 2012-01
// 
// 
// 2 24 1 1 1 -1 1 1
  [2,24,1,1,1,-1,1,1],
// 2 24 -1 1 1 -1 1 -1
  [2,24,-1,1,1,-1,1,-1],
// 2 24 -1 1 -1 1 1 -1
  [2,24,-1,1,-1,1,1,-1],
// 2 24 1 1 -1 1 1 1
  [2,24,1,1,-1,1,1,1],
// 2 24 1 0 1 -1 0 1
  [2,24,1,0,1,-1,0,1],
// 2 24 -1 0 1 -1 0 -1
  [2,24,-1,0,1,-1,0,-1],
// 2 24 -1 0 -1 1 0 -1
  [2,24,-1,0,-1,1,0,-1],
// 2 24 1 0 -1 1 0 1
  [2,24,1,0,-1,1,0,1],
// 2 24 1 0 1 1 1 1
  [2,24,1,0,1,1,1,1],
// 2 24 -1 0 1 -1 1 1
  [2,24,-1,0,1,-1,1,1],
// 2 24 1 0 -1 1 1 -1
  [2,24,1,0,-1,1,1,-1],
// 2 24 -1 0 -1 -1 1 -1
  [2,24,-1,0,-1,-1,1,-1],
// 4 16 -1 1 1 1 1 1 1 1 -1 -1 1 -1
  [4,16,-1,1,1,1,1,1,1,1,-1,-1,1,-1],
// 4 16 -1 1 1 -1 0 1 1 0 1 1 1 1
  [4,16,-1,1,1,-1,0,1,1,0,1,1,1,1],
// 4 16 -1 1 -1 -1 0 -1 -1 0 1 -1 1 1
  [4,16,-1,1,-1,-1,0,-1,-1,0,1,-1,1,1],
// 4 16 1 1 -1 1 0 -1 -1 0 -1 -1 1 -1
  [4,16,1,1,-1,1,0,-1,-1,0,-1,-1,1,-1],
// 4 16 1 1 1 1 0 1 1 0 -1 1 1 -1
  [4,16,1,1,1,1,0,1,1,0,-1,1,1,-1],
];
makepoly(ldraw_lib__box5(), line=0.2);
// file: s/3009s01.scad
use <../../lib.scad>
use <../../p/box5.scad>
use <../../p/stud.scad>
use <../../p/stud3.scad>
$fa=1; $fs=0.2;
function ldraw_lib__s__3009s01(realsolid=false) = [
// 0 ~Brick  1 x  6 without Front Face
// 0 Name: s\3009s01.dat
// 0 Author: James Jessiman
// 0 !LDRAW_ORG Subpart UPDATE 2003-03
// 0 !LICENSE Licensed under CC BY 2.0 and CC BY 4.0 : see CAreadme.txt
// 
// 0 BFC CERTIFY CCW
  [0,"BFC","CERTIFY"],
  [0,"BFC","CCW"],
// 
// 0 !HISTORY 2002-05-07 {unknown} BFC Certification
// 0 !HISTORY 2003-07-03 [Steffen] Subfiled for patterning
// 0 !HISTORY 2003-12-19 [PTadmin] Official Update 2003-03
// 0 !HISTORY 2007-08-29 [PTadmin] Header formatted for Contributor Agreement
// 0 !HISTORY 2008-07-01 [PTadmin] Official Update 2008-01
// 
// 
// 1 16 40 4 0 1 0 0 0 -5 0 0 0 1 stud3.dat
  [1,16,40,4,0,1,0,0,0,-5,0,0,0,1, ldraw_lib__stud3(realsolid)],
// 1 16 20 4 0 1 0 0 0 -5 0 0 0 1 stud3.dat
  [1,16,20,4,0,1,0,0,0,-5,0,0,0,1, ldraw_lib__stud3(realsolid)],
// 1 16 0 4 0 1 0 0 0 -5 0 0 0 1 stud3.dat
  [1,16,0,4,0,1,0,0,0,-5,0,0,0,1, ldraw_lib__stud3(realsolid)],
// 1 16 -20 4 0 1 0 0 0 -5 0 0 0 1 stud3.dat
  [1,16,-20,4,0,1,0,0,0,-5,0,0,0,1, ldraw_lib__stud3(realsolid)],
// 1 16 -40 4 0 1 0 0 0 -5 0 0 0 1 stud3.dat
  [1,16,-40,4,0,1,0,0,0,-5,0,0,0,1, ldraw_lib__stud3(realsolid)],
// 0 BFC INVERTNEXT
  [0,"BFC","INVERTNEXT"],
// 1 16 0 24 0 56 0 0 0 -20 0 0 0 6 box5.dat
  [1,16,0,24,0,56,0,0,0,-20,0,0,0,6, ldraw_lib__box5(realsolid)],
// 4 16 60 24 10 56 24 6 -56 24 6 -60 24 10
  [4,16,60,24,10,56,24,6,-56,24,6,-60,24,10],
// 4 16 -60 24 10 -56 24 6 -56 24 -6 -60 24 -10
  [4,16,-60,24,10,-56,24,6,-56,24,-6,-60,24,-10],
// 4 16 -60 24 -10 -56 24 -6 56 24 -6 60 24 -10
  [4,16,-60,24,-10,-56,24,-6,56,24,-6,60,24,-10],
// 4 16 60 24 -10 56 24 -6 56 24 6 60 24 10
  [4,16,60,24,-10,56,24,-6,56,24,6,60,24,10],
// 2 24 60 0 10 -60 0 10
  [2,24,60,0,10,-60,0,10],
// 2 24 -60 0 10 -60 0 -10
  [2,24,-60,0,10,-60,0,-10],
// 2 24 -60 0 -10 60 0 -10
  [2,24,-60,0,-10,60,0,-10],
// 2 24 60 0 -10 60 0 10
  [2,24,60,0,-10,60,0,10],
// 2 24 60 24 10 -60 24 10
  [2,24,60,24,10,-60,24,10],
// 2 24 -60 24 10 -60 24 -10
  [2,24,-60,24,10,-60,24,-10],
// 2 24 -60 24 -10 60 24 -10
  [2,24,-60,24,-10,60,24,-10],
// 2 24 60 24 -10 60 24 10
  [2,24,60,24,-10,60,24,10],
// 2 24 60 24 10 60 0 10
  [2,24,60,24,10,60,0,10],
// 2 24 -60 24 10 -60 0 10
  [2,24,-60,24,10,-60,0,10],
// 2 24 60 24 -10 60 0 -10
  [2,24,60,24,-10,60,0,-10],
// 2 24 -60 24 -10 -60 0 -10
  [2,24,-60,24,-10,-60,0,-10],
// 4 16 -60 0 -10 60 0 -10 60 0 10 -60 0 10
  [4,16,-60,0,-10,60,0,-10,60,0,10,-60,0,10],
// 4 16 -60 0 10 -60 24 10 -60 24 -10 -60 0 -10
  [4,16,-60,0,10,-60,24,10,-60,24,-10,-60,0,-10],
// 4 16 60 0 10 60 24 10 -60 24 10 -60 0 10
  [4,16,60,0,10,60,24,10,-60,24,10,-60,0,10],
// 4 16 60 0 -10 60 24 -10 60 24 10 60 0 10
  [4,16,60,0,-10,60,24,-10,60,24,10,60,0,10],
// 1 16 50 0 0 1 0 0 0 1 0 0 0 1 stud.dat
  [1,16,50,0,0,1,0,0,0,1,0,0,0,1, ldraw_lib__stud(realsolid)],
// 1 16 30 0 0 1 0 0 0 1 0 0 0 1 stud.dat
  [1,16,30,0,0,1,0,0,0,1,0,0,0,1, ldraw_lib__stud(realsolid)],
// 1 16 10 0 0 1 0 0 0 1 0 0 0 1 stud.dat
  [1,16,10,0,0,1,0,0,0,1,0,0,0,1, ldraw_lib__stud(realsolid)],
// 1 16 -10 0 0 1 0 0 0 1 0 0 0 1 stud.dat
  [1,16,-10,0,0,1,0,0,0,1,0,0,0,1, ldraw_lib__stud(realsolid)],
// 1 16 -30 0 0 1 0 0 0 1 0 0 0 1 stud.dat
  [1,16,-30,0,0,1,0,0,0,1,0,0,0,1, ldraw_lib__stud(realsolid)],
// 1 16 -50 0 0 1 0 0 0 1 0 0 0 1 stud.dat
  [1,16,-50,0,0,1,0,0,0,1,0,0,0,1, ldraw_lib__stud(realsolid)],
// 0
];
module ldraw_lib__s__3009s01(step=0, col=false, unit=2/5, alt=false, line=0.2, solid=!$preview)
    makepoly(ldraw_lib__s__3009s01(solid), step=step, col=col, unit=unit, alt=alt, line=line, solid=solid);
ldraw_lib__s__3009s01(line=0.2);
// main file
use <../lib.scad>
use <s/3009pt9a.scad>
use <s/3009pt9b.scad>
use <s/3009s01.scad>
function ldraw_lib__3009pta() = [
// 0 Brick  1 x  6 with "ROYAL MAIL" White Pattern
// 0 Name: 3009pta.dat
// 0 Author: J.C. Tchang [tchang]
// 0 !LDRAW_ORG Part UPDATE 2012-03
// 0 !LICENSE Licensed under CC BY 4.0 : see CAreadme.txt
// 
// 0 BFC CERTIFY CCW
  [0,"BFC","CERTIFY"],
  [0,"BFC","CCW"],
// 
// 0 !KEYWORDS BrickLink 3009pb025, Rebrickable 3009pr0070, Set 113-2-DBASE
// 
// 0 !HISTORY 2012-12-28 [PTadmin] Official Update 2012-03
// 
// 
// 1 16 0 0 0 1 0 0 0 1 0 0 0 1 s\3009s01.dat
  [1,16,0,0,0,1,0,0,0,1,0,0,0,1, ldraw_lib__s__3009s01()],
// 0 //
// 4 16 -60 24 -10 -45.675 22.538 -10 -45.675 2.062 -10 -60 0 -10
  [4,16,-60,24,-10,-45.675,22.538,-10,-45.675,2.062,-10,-60,0,-10],
// 4 16 45.675 2.062 -10 45.675 22.538 -10 60 24 -10 60 0 -10
  [4,16,45.675,2.062,-10,45.675,22.538,-10,60,24,-10,60,0,-10],
// 4 16 -45.675 2.062 -10 45.675 2.062 -10 60 0 -10 -60 0 -10
  [4,16,-45.675,2.062,-10,45.675,2.062,-10,60,0,-10,-60,0,-10],
// 4 16 45.675 22.538 -10 -45.675 22.538 -10 -60 24 -10 60 24 -10
  [4,16,45.675,22.538,-10,-45.675,22.538,-10,-60,24,-10,60,24,-10],
// 0 //
// 1 15 0 -0.3 0 1.05 0 0 0 1.05 0 0 0 1 s\3009pt9a.dat
  [1,15,0,-0.3,0,1.05,0,0,0,1.05,0,0,0,1, ldraw_lib__s__3009pt9a()],
// 1 16 0 -0.3 0 1.05 0 0 0 1.05 0 0 0 1 s\3009pt9b.dat
  [1,16,0,-0.3,0,1.05,0,0,0,1.05,0,0,0,1, ldraw_lib__s__3009pt9b()],
// 
];
module ldraw_lib__3009pta(step=0, col=false, unit=2/5, alt=false, line=0.2, solid=!$preview)
    makepoly(ldraw_lib__3009pta(), step=step, col=col, unit=unit, alt=alt, line=line, solid=solid);
ldraw_lib__3009pta(line=0.2);
